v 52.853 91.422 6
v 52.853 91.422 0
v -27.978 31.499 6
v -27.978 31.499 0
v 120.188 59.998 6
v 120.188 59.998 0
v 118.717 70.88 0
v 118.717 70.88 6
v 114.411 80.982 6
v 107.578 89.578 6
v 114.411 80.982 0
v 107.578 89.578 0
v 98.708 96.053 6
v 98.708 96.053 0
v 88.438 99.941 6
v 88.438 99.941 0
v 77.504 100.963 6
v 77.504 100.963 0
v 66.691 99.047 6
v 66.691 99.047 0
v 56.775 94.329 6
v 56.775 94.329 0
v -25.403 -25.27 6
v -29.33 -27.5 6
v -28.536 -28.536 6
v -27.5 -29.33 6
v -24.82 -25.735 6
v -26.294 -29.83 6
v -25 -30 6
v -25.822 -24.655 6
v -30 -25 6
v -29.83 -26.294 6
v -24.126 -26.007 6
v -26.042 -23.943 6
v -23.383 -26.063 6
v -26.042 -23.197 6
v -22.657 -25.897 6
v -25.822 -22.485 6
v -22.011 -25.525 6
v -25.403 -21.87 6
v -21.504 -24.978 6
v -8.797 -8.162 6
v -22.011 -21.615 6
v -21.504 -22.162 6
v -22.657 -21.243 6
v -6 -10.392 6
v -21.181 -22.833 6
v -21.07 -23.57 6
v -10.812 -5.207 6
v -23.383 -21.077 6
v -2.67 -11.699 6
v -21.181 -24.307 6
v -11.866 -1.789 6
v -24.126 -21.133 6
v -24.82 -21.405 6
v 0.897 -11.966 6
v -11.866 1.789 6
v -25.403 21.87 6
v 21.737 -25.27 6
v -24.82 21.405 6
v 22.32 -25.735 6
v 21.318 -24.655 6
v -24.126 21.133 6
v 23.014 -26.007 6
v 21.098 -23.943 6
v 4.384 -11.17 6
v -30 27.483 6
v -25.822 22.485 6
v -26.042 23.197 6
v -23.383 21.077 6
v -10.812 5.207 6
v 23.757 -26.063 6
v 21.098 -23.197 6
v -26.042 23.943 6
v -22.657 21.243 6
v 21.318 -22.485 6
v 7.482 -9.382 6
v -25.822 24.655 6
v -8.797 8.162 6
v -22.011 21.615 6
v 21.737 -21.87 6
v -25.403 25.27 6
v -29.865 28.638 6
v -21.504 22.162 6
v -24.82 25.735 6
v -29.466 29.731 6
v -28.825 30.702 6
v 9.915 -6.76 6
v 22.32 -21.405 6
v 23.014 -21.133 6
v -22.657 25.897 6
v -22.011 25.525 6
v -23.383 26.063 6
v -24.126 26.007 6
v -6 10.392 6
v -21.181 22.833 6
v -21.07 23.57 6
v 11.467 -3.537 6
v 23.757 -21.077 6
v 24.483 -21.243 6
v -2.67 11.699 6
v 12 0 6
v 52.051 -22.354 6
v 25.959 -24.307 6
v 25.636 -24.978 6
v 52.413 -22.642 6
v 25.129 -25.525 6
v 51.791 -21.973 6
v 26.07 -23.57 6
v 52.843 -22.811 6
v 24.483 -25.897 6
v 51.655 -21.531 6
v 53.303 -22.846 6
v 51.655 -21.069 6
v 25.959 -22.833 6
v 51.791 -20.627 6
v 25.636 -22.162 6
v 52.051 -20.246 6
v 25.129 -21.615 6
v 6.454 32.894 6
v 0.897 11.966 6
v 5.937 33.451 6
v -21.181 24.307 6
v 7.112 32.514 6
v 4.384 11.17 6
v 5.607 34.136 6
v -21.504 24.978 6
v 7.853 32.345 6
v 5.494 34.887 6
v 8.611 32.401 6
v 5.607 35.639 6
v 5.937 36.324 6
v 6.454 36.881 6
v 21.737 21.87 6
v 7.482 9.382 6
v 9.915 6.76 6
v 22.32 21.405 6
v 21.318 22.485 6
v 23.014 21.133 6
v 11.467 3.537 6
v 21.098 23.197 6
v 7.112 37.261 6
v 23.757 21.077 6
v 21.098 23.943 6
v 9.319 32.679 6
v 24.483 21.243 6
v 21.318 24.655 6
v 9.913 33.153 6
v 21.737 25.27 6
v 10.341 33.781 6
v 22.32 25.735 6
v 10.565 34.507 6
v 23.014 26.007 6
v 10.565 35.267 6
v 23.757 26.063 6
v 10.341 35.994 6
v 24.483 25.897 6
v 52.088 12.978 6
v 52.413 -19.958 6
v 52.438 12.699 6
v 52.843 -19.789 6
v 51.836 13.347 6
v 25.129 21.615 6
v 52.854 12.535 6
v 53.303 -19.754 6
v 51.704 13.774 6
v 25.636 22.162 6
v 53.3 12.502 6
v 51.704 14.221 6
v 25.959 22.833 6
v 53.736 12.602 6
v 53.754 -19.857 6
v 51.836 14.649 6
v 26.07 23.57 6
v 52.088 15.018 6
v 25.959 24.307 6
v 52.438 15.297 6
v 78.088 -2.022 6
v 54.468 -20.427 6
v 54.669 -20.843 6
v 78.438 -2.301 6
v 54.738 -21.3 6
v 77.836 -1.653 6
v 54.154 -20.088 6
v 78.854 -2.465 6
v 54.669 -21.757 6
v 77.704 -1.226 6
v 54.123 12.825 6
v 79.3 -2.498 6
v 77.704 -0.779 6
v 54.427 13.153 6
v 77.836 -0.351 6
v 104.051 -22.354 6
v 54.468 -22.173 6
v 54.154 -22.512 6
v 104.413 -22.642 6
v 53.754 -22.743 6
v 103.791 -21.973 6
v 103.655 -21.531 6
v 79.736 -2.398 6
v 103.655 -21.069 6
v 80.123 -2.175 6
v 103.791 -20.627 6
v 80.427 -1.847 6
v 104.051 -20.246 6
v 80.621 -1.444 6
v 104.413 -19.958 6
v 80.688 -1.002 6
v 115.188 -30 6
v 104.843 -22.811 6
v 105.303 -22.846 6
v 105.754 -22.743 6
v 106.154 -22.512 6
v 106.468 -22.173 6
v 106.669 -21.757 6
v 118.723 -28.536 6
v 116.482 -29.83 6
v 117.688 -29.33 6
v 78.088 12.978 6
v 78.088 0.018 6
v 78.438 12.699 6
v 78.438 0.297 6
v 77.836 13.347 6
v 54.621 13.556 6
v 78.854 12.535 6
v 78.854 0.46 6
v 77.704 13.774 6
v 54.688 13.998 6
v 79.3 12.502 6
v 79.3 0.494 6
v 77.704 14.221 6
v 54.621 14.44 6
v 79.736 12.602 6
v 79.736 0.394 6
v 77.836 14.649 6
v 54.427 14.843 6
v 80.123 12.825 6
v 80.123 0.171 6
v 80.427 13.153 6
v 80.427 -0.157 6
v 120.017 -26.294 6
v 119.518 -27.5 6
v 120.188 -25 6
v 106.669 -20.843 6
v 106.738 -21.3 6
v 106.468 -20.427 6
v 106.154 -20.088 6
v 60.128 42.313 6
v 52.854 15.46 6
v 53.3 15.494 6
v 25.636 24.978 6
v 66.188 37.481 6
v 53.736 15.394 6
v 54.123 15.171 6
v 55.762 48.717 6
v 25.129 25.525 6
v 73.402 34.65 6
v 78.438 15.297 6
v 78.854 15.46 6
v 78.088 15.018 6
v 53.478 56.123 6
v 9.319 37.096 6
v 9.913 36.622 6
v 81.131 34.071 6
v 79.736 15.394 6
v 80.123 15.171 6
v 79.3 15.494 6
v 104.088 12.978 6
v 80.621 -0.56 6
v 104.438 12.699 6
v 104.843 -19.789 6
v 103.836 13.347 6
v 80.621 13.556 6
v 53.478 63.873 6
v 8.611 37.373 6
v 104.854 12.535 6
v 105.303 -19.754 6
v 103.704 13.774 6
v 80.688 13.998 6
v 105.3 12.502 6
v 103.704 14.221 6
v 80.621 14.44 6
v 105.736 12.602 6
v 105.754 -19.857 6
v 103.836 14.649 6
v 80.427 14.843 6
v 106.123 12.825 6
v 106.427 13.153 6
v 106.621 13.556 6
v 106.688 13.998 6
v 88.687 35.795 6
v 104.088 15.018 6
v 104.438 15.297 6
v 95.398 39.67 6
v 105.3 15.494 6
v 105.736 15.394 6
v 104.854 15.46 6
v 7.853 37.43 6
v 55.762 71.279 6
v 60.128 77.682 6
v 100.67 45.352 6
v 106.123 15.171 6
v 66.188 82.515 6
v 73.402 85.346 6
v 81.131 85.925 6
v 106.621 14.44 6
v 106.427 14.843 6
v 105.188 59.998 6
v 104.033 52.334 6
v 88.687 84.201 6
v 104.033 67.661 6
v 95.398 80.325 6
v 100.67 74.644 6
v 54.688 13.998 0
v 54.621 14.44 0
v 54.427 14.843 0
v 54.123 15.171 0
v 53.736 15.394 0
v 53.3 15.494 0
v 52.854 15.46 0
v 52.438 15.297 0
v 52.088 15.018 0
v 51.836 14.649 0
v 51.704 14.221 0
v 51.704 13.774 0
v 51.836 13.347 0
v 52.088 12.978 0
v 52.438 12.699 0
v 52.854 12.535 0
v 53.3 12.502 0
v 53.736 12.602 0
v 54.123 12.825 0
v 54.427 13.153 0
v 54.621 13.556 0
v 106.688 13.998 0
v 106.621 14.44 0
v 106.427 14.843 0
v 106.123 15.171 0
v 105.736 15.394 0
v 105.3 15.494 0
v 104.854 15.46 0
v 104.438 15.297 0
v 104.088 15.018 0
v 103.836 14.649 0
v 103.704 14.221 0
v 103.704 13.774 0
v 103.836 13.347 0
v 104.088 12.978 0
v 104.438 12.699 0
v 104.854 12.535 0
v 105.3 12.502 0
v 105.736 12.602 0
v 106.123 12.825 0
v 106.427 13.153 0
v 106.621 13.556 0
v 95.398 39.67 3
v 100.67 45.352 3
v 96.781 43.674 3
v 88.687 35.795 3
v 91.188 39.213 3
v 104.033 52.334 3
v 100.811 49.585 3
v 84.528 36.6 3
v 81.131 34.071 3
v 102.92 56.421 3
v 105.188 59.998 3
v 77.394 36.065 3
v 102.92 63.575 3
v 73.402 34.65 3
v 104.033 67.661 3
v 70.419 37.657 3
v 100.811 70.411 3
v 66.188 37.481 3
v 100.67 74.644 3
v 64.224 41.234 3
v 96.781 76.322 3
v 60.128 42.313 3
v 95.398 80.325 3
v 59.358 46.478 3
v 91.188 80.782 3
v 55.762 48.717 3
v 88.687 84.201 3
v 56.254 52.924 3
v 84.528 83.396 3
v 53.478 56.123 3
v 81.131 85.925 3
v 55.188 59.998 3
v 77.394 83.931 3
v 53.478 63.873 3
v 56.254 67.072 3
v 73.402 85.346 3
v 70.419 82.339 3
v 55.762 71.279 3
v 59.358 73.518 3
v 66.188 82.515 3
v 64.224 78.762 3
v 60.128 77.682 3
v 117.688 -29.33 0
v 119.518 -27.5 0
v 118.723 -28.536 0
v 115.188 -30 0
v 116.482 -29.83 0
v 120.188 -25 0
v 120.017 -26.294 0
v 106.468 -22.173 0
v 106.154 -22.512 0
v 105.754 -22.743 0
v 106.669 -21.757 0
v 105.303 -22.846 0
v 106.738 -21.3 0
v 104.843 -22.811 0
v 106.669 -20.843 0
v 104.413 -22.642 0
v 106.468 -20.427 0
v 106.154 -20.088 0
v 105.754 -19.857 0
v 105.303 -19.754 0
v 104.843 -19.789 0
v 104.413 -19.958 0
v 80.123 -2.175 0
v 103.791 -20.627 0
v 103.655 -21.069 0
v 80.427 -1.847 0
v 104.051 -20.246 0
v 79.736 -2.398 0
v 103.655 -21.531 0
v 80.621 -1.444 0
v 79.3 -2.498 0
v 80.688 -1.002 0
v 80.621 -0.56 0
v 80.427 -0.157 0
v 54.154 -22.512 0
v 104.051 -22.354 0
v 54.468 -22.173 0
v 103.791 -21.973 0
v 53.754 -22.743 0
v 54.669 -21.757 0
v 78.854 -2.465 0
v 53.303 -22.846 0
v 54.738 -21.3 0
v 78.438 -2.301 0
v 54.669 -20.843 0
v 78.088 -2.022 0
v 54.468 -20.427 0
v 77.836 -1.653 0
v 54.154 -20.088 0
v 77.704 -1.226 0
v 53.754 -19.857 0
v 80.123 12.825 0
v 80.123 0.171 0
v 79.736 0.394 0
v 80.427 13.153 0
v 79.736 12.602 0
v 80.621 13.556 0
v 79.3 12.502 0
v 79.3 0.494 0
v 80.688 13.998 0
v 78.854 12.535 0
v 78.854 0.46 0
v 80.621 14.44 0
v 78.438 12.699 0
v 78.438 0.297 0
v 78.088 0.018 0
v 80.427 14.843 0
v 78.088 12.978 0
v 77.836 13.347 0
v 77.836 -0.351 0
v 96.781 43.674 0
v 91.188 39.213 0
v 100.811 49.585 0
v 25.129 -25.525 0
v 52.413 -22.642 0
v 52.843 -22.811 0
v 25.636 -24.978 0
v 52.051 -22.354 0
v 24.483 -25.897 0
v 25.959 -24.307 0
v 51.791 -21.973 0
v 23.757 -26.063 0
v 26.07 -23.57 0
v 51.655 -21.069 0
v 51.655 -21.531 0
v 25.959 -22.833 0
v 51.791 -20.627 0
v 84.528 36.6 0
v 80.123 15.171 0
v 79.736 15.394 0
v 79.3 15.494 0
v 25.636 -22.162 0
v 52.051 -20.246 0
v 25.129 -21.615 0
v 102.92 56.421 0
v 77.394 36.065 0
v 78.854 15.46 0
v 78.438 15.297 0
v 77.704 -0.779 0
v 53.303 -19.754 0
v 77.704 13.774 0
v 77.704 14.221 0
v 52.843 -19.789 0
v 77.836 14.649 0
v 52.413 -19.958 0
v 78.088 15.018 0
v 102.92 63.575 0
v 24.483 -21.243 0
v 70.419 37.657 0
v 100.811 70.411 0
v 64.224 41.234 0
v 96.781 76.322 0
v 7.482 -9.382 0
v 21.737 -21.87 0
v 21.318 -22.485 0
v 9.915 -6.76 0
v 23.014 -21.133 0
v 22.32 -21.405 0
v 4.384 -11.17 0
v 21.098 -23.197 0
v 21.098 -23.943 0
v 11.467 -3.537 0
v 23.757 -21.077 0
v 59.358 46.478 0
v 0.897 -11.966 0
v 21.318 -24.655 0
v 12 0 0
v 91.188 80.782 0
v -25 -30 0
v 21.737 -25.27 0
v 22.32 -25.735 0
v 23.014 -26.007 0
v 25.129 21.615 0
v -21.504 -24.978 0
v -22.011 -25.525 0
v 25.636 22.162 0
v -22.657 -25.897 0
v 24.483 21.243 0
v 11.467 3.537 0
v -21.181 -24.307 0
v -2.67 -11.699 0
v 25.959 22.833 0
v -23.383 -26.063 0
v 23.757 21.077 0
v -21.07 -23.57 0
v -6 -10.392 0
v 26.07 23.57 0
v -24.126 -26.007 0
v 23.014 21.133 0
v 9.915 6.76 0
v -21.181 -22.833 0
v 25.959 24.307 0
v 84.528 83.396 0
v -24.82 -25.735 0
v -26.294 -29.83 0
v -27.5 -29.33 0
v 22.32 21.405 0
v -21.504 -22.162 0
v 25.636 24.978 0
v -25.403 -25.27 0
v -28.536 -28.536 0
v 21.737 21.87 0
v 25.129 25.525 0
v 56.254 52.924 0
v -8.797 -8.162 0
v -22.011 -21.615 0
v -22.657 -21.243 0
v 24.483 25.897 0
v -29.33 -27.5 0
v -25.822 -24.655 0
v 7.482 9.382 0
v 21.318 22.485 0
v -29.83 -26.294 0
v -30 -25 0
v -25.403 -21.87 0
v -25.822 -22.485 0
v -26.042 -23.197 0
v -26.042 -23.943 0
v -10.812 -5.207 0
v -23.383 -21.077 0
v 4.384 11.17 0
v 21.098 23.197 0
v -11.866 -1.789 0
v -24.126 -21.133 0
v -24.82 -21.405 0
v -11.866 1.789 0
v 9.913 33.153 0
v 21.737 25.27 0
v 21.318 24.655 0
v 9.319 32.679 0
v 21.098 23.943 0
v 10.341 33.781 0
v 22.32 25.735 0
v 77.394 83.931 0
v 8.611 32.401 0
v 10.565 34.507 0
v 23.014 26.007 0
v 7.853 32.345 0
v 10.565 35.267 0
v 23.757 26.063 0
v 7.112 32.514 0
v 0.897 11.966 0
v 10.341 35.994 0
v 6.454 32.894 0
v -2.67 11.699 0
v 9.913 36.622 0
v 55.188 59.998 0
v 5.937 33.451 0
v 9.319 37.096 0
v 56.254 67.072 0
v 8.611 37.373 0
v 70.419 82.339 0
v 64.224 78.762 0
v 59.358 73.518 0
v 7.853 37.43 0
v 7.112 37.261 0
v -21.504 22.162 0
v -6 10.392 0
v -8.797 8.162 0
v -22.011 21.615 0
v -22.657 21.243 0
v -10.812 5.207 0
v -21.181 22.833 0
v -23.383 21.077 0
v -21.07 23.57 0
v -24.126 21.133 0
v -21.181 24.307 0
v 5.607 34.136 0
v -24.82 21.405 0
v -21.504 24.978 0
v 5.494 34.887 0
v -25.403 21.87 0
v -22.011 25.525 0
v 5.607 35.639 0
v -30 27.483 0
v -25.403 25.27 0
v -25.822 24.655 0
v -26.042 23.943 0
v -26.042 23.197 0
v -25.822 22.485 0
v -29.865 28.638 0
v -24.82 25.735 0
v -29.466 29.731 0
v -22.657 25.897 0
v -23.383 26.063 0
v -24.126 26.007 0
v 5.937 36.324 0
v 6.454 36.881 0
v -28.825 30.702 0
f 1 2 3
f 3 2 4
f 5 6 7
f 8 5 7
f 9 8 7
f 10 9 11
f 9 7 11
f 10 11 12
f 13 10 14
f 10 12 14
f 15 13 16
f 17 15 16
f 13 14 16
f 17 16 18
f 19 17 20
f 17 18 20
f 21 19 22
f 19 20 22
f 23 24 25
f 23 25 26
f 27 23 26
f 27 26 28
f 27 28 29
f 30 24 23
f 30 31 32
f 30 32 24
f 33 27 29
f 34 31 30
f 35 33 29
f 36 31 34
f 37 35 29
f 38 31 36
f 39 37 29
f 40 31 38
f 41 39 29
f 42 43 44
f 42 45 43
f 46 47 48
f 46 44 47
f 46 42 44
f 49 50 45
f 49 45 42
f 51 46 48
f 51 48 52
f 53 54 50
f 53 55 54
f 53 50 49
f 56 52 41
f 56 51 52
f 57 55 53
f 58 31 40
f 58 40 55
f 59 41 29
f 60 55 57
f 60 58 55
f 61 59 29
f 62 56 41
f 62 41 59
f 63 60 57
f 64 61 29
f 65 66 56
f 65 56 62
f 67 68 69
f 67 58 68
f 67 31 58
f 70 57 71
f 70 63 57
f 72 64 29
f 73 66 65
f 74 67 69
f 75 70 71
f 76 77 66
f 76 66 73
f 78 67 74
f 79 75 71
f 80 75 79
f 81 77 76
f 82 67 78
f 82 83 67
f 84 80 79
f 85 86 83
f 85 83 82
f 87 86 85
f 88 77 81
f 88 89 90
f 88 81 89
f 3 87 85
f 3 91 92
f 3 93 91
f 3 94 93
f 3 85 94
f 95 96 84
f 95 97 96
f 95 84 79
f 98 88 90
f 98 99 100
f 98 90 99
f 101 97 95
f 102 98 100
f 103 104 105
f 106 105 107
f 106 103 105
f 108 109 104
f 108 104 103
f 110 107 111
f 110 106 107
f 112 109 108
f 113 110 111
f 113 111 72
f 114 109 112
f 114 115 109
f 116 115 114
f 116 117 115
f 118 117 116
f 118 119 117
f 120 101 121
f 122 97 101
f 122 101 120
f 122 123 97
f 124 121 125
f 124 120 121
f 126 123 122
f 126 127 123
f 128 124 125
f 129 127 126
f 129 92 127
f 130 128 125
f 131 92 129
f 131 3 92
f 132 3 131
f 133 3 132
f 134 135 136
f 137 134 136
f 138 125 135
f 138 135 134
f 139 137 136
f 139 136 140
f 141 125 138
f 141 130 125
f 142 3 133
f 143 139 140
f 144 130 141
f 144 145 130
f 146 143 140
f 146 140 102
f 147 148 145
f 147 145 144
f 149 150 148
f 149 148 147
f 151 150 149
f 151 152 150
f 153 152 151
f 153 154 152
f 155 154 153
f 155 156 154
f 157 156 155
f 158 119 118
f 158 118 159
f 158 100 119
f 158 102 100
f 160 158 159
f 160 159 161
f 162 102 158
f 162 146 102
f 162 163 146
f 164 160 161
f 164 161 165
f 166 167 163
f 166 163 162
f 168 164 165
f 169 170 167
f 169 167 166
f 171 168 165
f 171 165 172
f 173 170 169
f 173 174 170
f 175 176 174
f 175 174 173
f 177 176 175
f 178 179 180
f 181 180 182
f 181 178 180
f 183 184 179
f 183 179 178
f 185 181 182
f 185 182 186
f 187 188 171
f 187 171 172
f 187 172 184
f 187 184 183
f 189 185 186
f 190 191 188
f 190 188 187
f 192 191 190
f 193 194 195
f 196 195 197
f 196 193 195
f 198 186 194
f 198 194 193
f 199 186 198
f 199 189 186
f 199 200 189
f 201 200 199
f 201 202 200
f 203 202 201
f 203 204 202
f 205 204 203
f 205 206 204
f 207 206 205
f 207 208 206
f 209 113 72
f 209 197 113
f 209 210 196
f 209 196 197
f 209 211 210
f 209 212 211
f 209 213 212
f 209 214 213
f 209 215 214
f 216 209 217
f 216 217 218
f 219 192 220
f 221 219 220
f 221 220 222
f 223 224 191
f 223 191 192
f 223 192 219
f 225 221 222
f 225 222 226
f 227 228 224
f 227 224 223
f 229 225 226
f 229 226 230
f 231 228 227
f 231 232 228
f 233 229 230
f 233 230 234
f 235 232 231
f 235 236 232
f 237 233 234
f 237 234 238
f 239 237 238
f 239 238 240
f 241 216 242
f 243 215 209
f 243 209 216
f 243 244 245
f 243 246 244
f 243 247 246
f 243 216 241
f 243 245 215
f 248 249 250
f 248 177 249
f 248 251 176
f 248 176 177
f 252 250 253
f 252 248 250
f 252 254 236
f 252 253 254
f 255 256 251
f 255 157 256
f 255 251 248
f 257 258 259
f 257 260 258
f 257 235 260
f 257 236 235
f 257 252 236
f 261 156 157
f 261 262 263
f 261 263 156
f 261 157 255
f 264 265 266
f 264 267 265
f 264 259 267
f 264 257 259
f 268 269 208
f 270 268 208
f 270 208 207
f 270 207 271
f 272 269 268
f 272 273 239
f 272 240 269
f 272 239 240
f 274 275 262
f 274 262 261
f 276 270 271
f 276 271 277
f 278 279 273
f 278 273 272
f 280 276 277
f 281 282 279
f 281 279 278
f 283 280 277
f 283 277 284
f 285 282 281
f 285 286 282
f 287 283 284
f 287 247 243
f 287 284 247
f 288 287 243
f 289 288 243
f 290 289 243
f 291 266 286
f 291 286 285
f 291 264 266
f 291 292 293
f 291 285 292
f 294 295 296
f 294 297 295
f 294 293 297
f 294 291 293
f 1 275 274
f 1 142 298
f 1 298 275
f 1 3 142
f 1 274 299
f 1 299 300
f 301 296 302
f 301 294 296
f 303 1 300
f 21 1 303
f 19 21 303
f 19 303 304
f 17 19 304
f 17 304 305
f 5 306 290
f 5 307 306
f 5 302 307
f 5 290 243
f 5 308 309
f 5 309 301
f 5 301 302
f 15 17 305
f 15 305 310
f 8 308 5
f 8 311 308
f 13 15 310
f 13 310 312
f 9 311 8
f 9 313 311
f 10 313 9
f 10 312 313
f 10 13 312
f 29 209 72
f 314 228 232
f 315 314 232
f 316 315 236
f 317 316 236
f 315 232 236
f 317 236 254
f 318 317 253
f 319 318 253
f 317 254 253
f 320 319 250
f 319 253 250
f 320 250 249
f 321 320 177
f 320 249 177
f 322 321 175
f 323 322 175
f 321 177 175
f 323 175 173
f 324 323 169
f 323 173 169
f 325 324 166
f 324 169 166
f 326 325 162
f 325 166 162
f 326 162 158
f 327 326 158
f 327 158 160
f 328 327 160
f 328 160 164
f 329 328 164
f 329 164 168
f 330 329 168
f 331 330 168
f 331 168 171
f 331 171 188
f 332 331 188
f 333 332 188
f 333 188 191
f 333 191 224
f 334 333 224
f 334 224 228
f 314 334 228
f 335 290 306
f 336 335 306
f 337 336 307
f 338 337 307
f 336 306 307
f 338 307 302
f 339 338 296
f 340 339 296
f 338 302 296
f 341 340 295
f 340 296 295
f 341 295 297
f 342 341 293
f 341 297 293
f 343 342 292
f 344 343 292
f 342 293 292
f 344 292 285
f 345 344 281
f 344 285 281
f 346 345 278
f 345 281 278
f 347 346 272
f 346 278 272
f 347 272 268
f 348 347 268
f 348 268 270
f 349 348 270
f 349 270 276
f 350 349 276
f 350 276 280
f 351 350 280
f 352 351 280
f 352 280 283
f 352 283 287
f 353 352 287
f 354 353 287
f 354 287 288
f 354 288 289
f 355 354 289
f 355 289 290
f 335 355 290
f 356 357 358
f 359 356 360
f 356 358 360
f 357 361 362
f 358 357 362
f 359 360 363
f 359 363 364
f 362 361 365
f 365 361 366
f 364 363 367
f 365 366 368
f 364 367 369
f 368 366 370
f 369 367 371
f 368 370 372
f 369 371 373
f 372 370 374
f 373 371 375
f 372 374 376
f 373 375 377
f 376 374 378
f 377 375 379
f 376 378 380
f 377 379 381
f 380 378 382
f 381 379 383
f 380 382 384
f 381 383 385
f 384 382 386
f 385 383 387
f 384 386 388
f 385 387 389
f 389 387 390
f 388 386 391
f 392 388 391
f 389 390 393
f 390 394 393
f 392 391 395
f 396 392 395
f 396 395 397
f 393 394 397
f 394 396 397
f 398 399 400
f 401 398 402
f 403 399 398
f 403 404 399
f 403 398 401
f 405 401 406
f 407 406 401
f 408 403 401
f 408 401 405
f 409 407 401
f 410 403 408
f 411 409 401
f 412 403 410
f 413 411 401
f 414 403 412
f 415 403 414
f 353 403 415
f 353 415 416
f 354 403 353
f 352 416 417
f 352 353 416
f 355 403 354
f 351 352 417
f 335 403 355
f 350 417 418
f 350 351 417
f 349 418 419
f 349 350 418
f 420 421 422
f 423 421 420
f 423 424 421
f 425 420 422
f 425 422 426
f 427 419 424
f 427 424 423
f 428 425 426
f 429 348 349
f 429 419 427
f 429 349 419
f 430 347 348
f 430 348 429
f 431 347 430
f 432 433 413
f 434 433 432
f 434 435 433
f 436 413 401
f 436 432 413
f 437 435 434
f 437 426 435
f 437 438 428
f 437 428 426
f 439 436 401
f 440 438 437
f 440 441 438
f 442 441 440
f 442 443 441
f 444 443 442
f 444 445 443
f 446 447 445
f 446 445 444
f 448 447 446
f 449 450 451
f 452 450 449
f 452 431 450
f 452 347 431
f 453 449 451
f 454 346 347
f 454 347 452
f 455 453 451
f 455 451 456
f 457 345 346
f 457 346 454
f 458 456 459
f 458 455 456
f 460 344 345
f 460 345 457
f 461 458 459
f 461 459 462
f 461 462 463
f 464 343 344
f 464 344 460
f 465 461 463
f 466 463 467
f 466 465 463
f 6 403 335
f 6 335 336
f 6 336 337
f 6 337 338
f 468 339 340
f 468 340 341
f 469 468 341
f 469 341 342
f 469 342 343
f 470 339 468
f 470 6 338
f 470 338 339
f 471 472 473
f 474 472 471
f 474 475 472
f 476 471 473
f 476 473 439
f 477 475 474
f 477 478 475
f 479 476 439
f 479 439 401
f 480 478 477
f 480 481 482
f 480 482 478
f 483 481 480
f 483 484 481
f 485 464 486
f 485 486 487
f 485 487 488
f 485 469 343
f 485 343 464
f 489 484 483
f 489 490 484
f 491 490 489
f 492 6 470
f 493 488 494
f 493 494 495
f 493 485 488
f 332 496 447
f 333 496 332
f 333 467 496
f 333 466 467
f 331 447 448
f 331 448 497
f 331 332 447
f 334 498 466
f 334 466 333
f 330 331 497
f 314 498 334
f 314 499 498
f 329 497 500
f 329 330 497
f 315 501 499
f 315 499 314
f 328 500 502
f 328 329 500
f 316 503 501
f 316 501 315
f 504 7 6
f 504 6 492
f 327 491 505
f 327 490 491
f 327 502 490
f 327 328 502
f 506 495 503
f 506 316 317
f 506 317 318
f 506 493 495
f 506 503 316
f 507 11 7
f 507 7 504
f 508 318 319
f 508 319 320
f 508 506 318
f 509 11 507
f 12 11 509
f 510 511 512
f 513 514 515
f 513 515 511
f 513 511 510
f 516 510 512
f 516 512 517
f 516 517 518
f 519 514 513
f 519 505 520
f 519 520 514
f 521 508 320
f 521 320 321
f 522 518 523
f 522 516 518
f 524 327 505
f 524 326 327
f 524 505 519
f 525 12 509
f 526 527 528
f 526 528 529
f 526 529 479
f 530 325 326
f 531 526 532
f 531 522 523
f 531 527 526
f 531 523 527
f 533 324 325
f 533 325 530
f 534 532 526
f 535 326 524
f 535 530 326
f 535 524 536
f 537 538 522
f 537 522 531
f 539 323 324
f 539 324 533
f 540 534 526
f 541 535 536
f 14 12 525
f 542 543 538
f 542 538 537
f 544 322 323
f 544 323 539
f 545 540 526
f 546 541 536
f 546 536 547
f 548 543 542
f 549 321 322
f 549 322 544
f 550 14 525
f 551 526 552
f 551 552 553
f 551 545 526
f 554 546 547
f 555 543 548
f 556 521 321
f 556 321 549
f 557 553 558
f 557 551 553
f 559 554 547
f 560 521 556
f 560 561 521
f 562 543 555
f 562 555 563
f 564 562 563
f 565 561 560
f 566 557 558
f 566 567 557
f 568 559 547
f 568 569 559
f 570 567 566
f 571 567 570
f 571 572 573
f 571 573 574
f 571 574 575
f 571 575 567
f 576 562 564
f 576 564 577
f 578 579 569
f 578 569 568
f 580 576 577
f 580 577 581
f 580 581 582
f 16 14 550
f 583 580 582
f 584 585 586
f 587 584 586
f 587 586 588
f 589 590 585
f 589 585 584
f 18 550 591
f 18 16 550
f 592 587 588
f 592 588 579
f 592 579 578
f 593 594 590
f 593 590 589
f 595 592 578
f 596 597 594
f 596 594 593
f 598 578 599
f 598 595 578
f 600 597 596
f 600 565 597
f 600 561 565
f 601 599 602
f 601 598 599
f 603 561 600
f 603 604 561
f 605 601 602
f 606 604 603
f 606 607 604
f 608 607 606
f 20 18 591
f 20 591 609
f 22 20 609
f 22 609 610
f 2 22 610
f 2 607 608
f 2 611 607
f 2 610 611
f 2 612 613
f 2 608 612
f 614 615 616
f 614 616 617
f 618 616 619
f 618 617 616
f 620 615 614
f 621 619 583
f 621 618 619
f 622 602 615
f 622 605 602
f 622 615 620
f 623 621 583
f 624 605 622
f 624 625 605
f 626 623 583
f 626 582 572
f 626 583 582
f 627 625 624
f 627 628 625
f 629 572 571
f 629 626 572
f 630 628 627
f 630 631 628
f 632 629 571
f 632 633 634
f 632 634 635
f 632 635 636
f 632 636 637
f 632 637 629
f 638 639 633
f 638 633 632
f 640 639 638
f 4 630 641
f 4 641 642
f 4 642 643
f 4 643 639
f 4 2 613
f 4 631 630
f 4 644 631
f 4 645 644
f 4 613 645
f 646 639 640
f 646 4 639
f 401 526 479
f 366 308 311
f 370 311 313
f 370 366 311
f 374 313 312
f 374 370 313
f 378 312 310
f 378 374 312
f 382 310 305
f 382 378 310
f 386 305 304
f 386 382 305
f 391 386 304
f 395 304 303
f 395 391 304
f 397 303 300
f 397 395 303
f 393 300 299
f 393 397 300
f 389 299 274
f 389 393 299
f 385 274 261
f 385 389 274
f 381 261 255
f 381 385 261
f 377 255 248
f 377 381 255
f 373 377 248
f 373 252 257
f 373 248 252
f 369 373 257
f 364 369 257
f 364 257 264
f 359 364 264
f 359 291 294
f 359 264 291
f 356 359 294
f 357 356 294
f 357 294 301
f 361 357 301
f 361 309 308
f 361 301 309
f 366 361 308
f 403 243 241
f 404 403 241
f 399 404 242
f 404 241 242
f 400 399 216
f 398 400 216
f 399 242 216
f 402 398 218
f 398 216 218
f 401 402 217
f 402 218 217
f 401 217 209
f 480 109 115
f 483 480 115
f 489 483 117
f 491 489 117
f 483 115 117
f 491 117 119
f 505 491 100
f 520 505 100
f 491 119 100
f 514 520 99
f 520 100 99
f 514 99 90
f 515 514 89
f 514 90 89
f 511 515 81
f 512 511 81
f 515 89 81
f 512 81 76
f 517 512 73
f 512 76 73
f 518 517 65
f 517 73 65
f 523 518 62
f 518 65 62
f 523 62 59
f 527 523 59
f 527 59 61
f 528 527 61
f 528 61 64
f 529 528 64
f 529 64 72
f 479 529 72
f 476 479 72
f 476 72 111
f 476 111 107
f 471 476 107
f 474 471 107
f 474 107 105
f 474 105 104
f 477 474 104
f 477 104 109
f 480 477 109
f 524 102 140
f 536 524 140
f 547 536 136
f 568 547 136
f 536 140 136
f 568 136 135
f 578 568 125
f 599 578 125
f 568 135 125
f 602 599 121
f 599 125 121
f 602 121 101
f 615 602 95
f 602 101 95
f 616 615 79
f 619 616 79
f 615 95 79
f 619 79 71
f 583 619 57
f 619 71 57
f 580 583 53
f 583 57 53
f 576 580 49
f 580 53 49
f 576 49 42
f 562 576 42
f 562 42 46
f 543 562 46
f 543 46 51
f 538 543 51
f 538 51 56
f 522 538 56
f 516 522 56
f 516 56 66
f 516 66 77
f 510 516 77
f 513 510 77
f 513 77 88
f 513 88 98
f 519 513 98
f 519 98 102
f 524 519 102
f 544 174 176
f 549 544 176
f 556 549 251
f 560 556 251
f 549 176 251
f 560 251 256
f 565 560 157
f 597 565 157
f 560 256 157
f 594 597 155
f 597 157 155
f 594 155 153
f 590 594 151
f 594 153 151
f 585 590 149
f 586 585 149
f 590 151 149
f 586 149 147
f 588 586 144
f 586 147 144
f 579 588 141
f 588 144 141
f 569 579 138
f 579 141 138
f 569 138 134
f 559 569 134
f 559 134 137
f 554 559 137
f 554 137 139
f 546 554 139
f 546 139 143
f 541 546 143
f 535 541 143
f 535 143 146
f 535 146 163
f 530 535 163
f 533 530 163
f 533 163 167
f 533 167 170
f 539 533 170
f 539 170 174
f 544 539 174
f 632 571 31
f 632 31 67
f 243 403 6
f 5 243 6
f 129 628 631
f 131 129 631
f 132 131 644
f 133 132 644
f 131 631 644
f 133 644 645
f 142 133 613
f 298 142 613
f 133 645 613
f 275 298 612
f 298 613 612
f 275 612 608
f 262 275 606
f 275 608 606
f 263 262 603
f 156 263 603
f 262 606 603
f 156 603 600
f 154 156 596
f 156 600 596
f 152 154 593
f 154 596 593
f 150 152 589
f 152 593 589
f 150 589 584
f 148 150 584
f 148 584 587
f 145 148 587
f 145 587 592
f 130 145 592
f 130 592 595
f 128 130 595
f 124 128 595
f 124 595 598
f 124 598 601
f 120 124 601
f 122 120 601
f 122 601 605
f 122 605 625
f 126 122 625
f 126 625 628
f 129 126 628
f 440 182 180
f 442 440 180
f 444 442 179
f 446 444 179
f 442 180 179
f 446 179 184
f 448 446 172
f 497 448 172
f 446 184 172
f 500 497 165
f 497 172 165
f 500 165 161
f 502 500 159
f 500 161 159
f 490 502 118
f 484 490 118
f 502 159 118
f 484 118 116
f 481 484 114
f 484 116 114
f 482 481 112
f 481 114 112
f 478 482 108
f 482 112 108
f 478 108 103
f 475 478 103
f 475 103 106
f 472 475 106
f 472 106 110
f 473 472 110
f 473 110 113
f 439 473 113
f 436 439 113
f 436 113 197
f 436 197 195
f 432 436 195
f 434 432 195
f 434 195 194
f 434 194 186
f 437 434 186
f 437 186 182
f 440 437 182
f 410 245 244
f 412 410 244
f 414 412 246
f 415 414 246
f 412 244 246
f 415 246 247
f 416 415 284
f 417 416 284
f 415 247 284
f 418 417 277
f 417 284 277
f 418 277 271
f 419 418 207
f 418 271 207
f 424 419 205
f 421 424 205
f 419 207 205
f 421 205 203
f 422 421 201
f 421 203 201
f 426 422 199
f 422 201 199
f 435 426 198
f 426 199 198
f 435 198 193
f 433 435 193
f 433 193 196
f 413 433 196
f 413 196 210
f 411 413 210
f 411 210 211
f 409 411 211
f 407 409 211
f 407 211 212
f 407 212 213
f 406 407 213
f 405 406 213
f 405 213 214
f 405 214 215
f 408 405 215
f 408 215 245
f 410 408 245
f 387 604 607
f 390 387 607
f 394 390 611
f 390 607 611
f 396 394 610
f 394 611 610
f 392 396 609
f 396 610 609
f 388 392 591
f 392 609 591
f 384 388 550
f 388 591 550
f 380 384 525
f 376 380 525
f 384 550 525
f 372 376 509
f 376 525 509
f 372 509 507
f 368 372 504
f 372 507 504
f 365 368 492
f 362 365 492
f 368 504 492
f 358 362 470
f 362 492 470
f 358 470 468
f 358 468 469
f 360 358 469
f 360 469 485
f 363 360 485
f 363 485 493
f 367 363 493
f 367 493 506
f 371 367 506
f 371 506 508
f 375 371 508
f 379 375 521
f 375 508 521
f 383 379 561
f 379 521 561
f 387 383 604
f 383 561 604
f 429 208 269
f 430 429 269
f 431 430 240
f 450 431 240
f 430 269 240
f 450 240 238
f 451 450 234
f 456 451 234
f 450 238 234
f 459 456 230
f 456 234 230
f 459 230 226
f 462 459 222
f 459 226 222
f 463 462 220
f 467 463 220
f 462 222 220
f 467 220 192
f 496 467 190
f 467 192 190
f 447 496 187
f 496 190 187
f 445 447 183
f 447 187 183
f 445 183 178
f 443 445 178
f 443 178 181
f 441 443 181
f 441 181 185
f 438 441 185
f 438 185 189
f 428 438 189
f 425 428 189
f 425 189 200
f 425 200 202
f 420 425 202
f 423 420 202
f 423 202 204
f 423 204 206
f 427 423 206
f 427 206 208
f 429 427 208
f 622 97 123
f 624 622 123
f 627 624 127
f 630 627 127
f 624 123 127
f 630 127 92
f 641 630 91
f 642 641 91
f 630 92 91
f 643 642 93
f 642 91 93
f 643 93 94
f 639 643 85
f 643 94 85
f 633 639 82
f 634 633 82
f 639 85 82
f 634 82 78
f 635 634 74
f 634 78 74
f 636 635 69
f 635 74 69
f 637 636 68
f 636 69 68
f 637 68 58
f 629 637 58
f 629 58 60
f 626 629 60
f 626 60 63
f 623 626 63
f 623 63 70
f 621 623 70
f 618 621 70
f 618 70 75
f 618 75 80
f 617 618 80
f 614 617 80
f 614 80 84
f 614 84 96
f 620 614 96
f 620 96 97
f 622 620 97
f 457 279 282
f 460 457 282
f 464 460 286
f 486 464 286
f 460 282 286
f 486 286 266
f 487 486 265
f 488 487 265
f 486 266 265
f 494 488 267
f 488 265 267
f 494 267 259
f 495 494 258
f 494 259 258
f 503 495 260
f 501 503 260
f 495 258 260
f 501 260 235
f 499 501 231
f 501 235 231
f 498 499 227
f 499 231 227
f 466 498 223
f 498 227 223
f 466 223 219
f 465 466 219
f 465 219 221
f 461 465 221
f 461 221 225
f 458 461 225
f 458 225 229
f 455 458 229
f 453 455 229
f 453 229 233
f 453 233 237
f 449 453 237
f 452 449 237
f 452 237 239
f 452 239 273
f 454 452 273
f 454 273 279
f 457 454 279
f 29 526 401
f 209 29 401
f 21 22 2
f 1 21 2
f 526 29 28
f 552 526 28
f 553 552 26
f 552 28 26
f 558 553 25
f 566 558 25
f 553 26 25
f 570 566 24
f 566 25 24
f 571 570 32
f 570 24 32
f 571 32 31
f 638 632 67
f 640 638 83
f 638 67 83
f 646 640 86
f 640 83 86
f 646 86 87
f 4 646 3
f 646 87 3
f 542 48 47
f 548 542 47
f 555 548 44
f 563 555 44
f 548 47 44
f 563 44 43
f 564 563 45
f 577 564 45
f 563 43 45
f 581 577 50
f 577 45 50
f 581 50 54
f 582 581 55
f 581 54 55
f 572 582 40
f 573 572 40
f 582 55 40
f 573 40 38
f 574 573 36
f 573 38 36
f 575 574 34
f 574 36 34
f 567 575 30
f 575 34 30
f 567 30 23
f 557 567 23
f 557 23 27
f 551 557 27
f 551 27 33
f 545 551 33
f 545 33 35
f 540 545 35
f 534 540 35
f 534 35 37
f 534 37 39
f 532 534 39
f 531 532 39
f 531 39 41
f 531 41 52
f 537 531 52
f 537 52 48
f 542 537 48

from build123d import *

# Parameters (mm, degrees)
SKETCH1_W           = 60
SKETCH1_H           = 60
SKETCH1_R           = 4
SKETCH1_R_2         = 26
BOSS_EXTRUDE1_DEPTH = 10
FILLET1_R           = 5
SKETCH3_R           = 26
SKETCH3_R_2         = 24
BOSS_EXTRUDE2_DEPTH = 3
SKETCH4_R           = 20
CUT_EXTRUDE1_DEPTH  = 1.6
SKETCH5_R           = 8
CUT_EXTRUDE2_DEPTH  = 158.213840184
SKETCH6_R           = 2.5
CUT_EXTRUDE3_DEPTH  = 158.307442752
SKETCH8_R           = 12
CUT_EXTRUDE5_DEPTH  = 158.213840184
SKETCH9_R           = 12
CUT_EXTRUDE6_DEPTH  = 4
SKETCH10_R          = 1.5
CUT_EXTRUDE7_DEPTH  = 158.103887747
SKETCH11_R          = 1.55
CUT_EXTRUDE8_DEPTH  = 158.103887747
SKETCH12_R          = 1.5
BOSS_EXTRUDE3_DEPTH = 6
SKETCH13_R          = 2.55
CUT_EXTRUDE9_DEPTH  = 158.103887747


with BuildPart() as part:
    # Sketch1 → Boss-Extrude1 (new body)
    # profile 1 of 3: a face of its own
    with BuildSketch(Plane.XY):
        with BuildLine():
            Line((52.853069415, 91.422204295), (-30, 30))
            Line((-30, 30), (30, 30))
            Line((30, 30), (30, -30))
            Line((30, -30), (120.187635495, -30))
            Line((120.187635495, -30), (120.187635495, 59.997840668))
            ThreePointArc((120.187635495, 59.997840668), (61.848621816, 22.844663083), (52.853069415, 91.422204295))
        make_face()
    # profile 2 of 3: a face of its own
    with BuildSketch(Plane.XY):
        Rectangle(SKETCH1_W, SKETCH1_H)
        Circle(SKETCH1_R, mode=Mode.SUBTRACT)
    # profile 3 of 3: a face of its own
    with BuildSketch(Plane.XY):
        with BuildLine():
            Line((56.774720343, 94.329476725), (52.853069415, 91.422204295))
            ThreePointArc((52.853069415, 91.422204295), (61.848621816, 22.844663083), (120.187635495, 59.997840668))
            ThreePointArc((120.187635495, 59.997840668), (98.707759454, 96.052864736), (56.774720343, 94.329476725))
        make_face()
        with Locations((79.187635495, 59.997840668)):
            Circle(SKETCH1_R_2, mode=Mode.SUBTRACT)
    extrude(amount=BOSS_EXTRUDE1_DEPTH)

    # Fillet1
    fillet1_edges = [part.edges().sort_by_distance(p)[0] for p in [
        (120.187635495, -30, 5),
        (-30, -30, 5),
        (-30, 30, 5),
    ]]
    fillet(fillet1_edges, radius=FILLET1_R)

    # Sketch3 → Boss-Extrude2 (add)
    with BuildSketch(Plane(origin=(0, 0, 0), x_dir=(-1, 0, 0), z_dir=(0, 0, -1))):
        with Locations((-79.187635495, 59.997840668)):
            Circle(SKETCH3_R)
        with Locations((-79.187635495, 59.997840668)):
            Circle(SKETCH3_R_2, mode=Mode.SUBTRACT)
    extrude(amount=-BOSS_EXTRUDE2_DEPTH)

    # Sketch4 → Cut-Extrude1 (cut)
    with BuildSketch(Plane.XY.offset(10)):
        Circle(SKETCH4_R)
    extrude(amount=-CUT_EXTRUDE1_DEPTH, mode=Mode.SUBTRACT)

    # Sketch5 → Cut-Extrude2 (cut, through all)
    with BuildSketch(Plane.XY.offset(8.4)):
        Circle(SKETCH5_R)
    extrude(amount=-CUT_EXTRUDE2_DEPTH, mode=Mode.SUBTRACT)

    # Sketch6 → Cut-Extrude3 (cut, through all)
    with BuildSketch(Plane.XY.offset(10)):
        with Locations((23.57, 23.57)):
            Circle(SKETCH6_R)
        with Locations((-23.57, 23.57)):
            Circle(SKETCH6_R)
        with Locations((-23.57, -23.57)):
            Circle(SKETCH6_R)
        with Locations((23.57, -23.57)):
            Circle(SKETCH6_R)
    extrude(amount=-CUT_EXTRUDE3_DEPTH, mode=Mode.SUBTRACT)

    # Sketch8 → Cut-Extrude5 (cut, through all)
    with BuildSketch(Plane.XY.offset(8.4)):
        Circle(SKETCH8_R)
    extrude(amount=-CUT_EXTRUDE5_DEPTH, mode=Mode.SUBTRACT)

    # Sketch9 → Cut-Extrude6 (cut)
    with BuildSketch(Plane.XY.offset(10)):
        with BuildLine():
            Line((-25, -30), (115.187635495, -30))
            ThreePointArc((115.187635495, -30), (118.723169401, -28.535533906), (120.187635495, -25))
            Line((120.187635495, -25), (120.187635495, 59.997840668))
            ThreePointArc((120.187635495, 59.997840668), (98.707759454, 96.052864736), (56.774720343, 94.329476725))
            Line((56.774720343, 94.329476725), (-27.977688922, 31.499217893))
            ThreePointArc((-27.977688922, 31.499217893), (-29.465895465, 29.731087062), (-30, 27.482581404))
            Line((-30, 27.482581404), (-30, -25))
            ThreePointArc((-30, -25), (-28.535533906, -28.535533906), (-25, -30))
        make_face()
        Circle(SKETCH9_R, mode=Mode.SUBTRACT)
    extrude(amount=-CUT_EXTRUDE6_DEPTH, mode=Mode.SUBTRACT)

    # Sketch10 → Cut-Extrude7 (cut, through all)
    with BuildSketch(Plane.XY.offset(6)):
        with Locations((53.187635495, -16.002159332)):
            Circle(SKETCH10_R)
        with Locations((105.187635495, -16.002159332)):
            Circle(SKETCH10_R)
        with Locations((105.187635495, 13.997840668)):
            Circle(SKETCH10_R)
        with Locations((79.187635495, -1.002159332)):
            Circle(SKETCH10_R)
        with Locations((53.187635495, 13.997840668)):
            Circle(SKETCH10_R)
        with Locations((79.187635495, 13.997840668)):
            Circle(SKETCH10_R)
    extrude(amount=-CUT_EXTRUDE7_DEPTH, mode=Mode.SUBTRACT)

    # Sketch11 → Cut-Extrude8 (cut, through all)
    with BuildSketch(Plane.XY.offset(6)):
        with Locations((53.187635495, -21.3)):
            Circle(SKETCH11_R)
        with Locations((105.187635495, -21.3)):
            Circle(SKETCH11_R)
    extrude(amount=-CUT_EXTRUDE8_DEPTH, mode=Mode.SUBTRACT)

    # Sketch12 → Boss-Extrude3 (add)
    with BuildSketch(Plane.XY.offset(6)):
        with Locations((53.187635495, -16.002159332)):
            Circle(SKETCH12_R)
        with Locations((105.187635495, -16.002159332)):
            Circle(SKETCH12_R)
    extrude(amount=-BOSS_EXTRUDE3_DEPTH)

    # Sketch13 → Cut-Extrude9 (cut, through all)
    with BuildSketch(Plane(origin=(0, 0, 0), x_dir=(-1, 0, 0), z_dir=(0, 0, -1))):
        with Locations((-8.043910978, 34.887394427)):
            Circle(SKETCH13_R)
    extrude(amount=-CUT_EXTRUDE9_DEPTH, mode=Mode.SUBTRACT)


solid = part.part
